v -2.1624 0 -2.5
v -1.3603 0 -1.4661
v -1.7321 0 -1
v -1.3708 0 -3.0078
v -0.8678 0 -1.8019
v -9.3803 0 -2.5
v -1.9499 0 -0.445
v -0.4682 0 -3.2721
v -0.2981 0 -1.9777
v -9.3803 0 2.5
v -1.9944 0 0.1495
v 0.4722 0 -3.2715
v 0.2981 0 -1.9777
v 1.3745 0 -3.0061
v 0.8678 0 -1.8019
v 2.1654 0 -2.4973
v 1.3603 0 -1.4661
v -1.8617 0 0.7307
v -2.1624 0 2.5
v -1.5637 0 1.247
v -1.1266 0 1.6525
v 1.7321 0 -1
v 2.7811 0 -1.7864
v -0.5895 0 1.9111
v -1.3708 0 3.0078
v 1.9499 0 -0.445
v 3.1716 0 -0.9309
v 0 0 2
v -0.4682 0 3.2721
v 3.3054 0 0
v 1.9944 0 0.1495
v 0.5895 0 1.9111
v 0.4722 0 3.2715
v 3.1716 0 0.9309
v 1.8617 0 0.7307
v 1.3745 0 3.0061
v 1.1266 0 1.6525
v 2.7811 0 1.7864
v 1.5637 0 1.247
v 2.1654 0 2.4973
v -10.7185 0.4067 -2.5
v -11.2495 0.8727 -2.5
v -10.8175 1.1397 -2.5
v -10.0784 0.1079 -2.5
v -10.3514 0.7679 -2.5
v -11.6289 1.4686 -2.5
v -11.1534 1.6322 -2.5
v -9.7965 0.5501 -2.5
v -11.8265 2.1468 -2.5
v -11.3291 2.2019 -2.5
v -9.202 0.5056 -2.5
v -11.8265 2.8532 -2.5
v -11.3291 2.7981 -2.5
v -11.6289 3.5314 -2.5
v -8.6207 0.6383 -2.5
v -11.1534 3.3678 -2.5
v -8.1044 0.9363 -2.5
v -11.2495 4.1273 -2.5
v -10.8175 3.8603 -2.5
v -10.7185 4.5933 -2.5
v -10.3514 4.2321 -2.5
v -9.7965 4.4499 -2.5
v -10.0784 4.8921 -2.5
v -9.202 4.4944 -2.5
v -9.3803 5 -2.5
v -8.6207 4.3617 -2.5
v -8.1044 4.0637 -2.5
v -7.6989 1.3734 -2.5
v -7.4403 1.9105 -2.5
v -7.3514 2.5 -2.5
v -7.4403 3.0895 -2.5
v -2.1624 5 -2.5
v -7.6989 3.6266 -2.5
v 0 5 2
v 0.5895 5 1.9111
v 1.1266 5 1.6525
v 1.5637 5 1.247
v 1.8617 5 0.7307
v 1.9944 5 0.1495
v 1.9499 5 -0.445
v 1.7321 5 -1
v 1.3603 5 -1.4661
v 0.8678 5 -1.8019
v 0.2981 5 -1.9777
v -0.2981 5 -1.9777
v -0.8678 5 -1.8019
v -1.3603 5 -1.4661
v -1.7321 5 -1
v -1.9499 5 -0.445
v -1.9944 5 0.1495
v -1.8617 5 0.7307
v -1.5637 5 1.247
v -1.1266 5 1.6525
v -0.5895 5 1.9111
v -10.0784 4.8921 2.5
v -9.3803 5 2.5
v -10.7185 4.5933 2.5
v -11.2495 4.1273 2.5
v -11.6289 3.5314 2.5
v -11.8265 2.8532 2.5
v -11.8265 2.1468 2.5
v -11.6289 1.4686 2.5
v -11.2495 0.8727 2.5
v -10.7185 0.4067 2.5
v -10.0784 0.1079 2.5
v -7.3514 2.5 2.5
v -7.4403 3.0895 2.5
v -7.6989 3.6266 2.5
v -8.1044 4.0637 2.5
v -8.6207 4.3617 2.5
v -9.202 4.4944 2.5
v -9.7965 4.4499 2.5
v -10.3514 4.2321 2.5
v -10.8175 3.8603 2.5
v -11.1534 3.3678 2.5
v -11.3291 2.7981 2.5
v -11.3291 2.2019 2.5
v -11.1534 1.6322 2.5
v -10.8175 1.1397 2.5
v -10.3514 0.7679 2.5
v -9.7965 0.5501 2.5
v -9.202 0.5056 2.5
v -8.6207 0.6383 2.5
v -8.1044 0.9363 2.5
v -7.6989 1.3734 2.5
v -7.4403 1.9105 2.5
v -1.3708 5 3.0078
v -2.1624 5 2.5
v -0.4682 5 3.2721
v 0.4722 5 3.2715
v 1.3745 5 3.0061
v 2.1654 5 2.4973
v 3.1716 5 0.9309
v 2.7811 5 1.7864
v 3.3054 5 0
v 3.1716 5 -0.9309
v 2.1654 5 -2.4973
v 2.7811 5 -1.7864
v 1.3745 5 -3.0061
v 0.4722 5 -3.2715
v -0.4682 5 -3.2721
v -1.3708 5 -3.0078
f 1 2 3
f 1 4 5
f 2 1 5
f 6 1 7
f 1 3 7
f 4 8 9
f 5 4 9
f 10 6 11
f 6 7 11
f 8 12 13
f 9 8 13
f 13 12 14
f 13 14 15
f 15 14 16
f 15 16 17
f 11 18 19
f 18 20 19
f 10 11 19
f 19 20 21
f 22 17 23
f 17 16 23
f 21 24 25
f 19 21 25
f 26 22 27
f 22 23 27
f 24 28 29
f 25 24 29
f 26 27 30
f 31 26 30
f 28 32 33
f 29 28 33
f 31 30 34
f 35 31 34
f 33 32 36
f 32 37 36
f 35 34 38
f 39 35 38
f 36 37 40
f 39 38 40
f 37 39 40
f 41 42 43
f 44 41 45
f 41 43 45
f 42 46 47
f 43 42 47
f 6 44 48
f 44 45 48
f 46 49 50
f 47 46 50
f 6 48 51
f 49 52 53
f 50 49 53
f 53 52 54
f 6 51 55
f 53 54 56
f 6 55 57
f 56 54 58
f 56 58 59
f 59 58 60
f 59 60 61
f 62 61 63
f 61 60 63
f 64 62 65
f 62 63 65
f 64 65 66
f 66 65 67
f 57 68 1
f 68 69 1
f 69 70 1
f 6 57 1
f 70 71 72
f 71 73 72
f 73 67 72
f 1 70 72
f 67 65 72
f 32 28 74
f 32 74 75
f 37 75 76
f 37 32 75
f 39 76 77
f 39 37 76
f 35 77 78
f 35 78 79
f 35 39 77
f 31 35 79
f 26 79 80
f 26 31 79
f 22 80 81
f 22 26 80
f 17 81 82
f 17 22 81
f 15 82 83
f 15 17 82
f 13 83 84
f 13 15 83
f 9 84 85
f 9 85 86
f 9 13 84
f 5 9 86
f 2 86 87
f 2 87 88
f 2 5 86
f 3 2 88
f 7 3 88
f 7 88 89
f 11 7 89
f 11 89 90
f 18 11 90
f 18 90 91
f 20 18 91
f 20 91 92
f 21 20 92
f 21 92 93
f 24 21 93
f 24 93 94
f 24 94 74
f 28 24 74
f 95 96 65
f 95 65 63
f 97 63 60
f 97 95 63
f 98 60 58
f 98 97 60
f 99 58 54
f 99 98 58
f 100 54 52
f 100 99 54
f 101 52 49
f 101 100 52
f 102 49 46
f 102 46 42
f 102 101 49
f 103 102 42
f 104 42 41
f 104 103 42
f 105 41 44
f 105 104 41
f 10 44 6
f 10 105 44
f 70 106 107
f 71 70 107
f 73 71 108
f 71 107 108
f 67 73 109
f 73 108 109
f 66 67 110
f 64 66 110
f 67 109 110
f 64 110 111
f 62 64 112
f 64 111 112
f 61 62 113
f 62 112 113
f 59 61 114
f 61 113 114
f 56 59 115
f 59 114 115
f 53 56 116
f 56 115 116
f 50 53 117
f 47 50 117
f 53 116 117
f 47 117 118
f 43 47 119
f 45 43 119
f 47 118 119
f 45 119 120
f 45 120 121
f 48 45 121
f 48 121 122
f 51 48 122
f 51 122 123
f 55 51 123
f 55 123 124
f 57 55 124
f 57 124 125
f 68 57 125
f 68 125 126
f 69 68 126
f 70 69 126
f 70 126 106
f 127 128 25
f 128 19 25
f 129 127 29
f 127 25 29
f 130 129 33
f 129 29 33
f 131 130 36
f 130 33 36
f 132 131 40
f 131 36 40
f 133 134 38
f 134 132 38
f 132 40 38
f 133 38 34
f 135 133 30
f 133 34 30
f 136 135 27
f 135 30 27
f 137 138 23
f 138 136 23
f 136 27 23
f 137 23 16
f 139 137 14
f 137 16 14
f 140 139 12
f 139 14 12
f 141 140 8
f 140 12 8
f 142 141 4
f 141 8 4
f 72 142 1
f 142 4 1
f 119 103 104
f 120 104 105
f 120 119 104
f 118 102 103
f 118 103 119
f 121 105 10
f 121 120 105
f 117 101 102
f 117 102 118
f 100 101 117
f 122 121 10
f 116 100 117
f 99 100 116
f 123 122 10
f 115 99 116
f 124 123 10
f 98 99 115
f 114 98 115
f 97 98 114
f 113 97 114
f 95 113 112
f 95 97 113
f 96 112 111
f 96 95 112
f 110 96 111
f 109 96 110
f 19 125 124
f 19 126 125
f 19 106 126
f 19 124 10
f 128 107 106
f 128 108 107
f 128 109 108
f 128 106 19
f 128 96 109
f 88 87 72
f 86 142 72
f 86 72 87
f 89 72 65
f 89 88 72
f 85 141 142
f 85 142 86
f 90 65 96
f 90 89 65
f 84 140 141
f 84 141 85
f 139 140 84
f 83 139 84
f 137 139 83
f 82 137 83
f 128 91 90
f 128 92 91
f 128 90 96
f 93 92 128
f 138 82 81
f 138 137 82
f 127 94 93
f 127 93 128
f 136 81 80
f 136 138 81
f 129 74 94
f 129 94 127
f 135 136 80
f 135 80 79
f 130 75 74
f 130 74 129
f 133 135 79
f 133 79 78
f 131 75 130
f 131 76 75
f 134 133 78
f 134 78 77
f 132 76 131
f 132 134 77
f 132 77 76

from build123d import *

# Parameters (mm, degrees)
SKETCH_1_R          = 3.305414419
SKETCH_1_R_2        = 2
EXTRUDE_1_DEPTH     = 5
EXTRUDE_2_DEPTH     = 2.5
CUT_EXTRUDE_START   = -5
SKETCH_5_R          = 2
CUT_EXTRUDE_1_DEPTH = 5
SKETCH_6_R          = 2
CUT_EXTRUDE_2_DEPTH = 15.112515325


with BuildPart() as part:
    # 草图1 → 凸台-拉伸1 (new body)
    with BuildSketch(Plane(origin=(0, 0, 0), x_dir=(1, 0, 0), z_dir=(0, 1, 0))):
        with Locations(Location((0, 0, 0), (0, 0, 270))):
            Circle(SKETCH_1_R)
        with Locations(Location((0, 0, 0), (0, 0, 270))):
            Circle(SKETCH_1_R_2, mode=Mode.SUBTRACT)
    extrude(amount=EXTRUDE_1_DEPTH)

    # 草图4 → 凸台-拉伸2 (add, symmetric)
    with BuildSketch(Plane.XY):
        with BuildLine():
            Line((0, 0), (0, 5))
            Line((0, 5), (-9.380296623, 5))
            ThreePointArc((-9.380296623, 5), (-11.851592814, 2.5), (-9.380296623, 0))
            Line((-9.380296623, 0), (0, 0))
        make_face()
    extrude(amount=EXTRUDE_2_DEPTH, both=True)

    # 草图5 → 切除-拉伸1 (cut)
    with BuildSketch(Plane(origin=(0, 5, 0), x_dir=(1, 0, 0), z_dir=(0, 1, 0)).offset(CUT_EXTRUDE_START)):
        with Locations(Location((0, 0, 0), (0, 0, 270))):
            Circle(SKETCH_5_R)
    extrude(amount=CUT_EXTRUDE_1_DEPTH, mode=Mode.SUBTRACT)

    # 草图6 → 切除-拉伸2 (cut, through all)
    with BuildSketch(Plane.XY.offset(2.5)):
        with Locations((-9.351426118, 2.5)):
            Circle(SKETCH_6_R)
    extrude(amount=-CUT_EXTRUDE_2_DEPTH, mode=Mode.SUBTRACT)


solid = part.part
